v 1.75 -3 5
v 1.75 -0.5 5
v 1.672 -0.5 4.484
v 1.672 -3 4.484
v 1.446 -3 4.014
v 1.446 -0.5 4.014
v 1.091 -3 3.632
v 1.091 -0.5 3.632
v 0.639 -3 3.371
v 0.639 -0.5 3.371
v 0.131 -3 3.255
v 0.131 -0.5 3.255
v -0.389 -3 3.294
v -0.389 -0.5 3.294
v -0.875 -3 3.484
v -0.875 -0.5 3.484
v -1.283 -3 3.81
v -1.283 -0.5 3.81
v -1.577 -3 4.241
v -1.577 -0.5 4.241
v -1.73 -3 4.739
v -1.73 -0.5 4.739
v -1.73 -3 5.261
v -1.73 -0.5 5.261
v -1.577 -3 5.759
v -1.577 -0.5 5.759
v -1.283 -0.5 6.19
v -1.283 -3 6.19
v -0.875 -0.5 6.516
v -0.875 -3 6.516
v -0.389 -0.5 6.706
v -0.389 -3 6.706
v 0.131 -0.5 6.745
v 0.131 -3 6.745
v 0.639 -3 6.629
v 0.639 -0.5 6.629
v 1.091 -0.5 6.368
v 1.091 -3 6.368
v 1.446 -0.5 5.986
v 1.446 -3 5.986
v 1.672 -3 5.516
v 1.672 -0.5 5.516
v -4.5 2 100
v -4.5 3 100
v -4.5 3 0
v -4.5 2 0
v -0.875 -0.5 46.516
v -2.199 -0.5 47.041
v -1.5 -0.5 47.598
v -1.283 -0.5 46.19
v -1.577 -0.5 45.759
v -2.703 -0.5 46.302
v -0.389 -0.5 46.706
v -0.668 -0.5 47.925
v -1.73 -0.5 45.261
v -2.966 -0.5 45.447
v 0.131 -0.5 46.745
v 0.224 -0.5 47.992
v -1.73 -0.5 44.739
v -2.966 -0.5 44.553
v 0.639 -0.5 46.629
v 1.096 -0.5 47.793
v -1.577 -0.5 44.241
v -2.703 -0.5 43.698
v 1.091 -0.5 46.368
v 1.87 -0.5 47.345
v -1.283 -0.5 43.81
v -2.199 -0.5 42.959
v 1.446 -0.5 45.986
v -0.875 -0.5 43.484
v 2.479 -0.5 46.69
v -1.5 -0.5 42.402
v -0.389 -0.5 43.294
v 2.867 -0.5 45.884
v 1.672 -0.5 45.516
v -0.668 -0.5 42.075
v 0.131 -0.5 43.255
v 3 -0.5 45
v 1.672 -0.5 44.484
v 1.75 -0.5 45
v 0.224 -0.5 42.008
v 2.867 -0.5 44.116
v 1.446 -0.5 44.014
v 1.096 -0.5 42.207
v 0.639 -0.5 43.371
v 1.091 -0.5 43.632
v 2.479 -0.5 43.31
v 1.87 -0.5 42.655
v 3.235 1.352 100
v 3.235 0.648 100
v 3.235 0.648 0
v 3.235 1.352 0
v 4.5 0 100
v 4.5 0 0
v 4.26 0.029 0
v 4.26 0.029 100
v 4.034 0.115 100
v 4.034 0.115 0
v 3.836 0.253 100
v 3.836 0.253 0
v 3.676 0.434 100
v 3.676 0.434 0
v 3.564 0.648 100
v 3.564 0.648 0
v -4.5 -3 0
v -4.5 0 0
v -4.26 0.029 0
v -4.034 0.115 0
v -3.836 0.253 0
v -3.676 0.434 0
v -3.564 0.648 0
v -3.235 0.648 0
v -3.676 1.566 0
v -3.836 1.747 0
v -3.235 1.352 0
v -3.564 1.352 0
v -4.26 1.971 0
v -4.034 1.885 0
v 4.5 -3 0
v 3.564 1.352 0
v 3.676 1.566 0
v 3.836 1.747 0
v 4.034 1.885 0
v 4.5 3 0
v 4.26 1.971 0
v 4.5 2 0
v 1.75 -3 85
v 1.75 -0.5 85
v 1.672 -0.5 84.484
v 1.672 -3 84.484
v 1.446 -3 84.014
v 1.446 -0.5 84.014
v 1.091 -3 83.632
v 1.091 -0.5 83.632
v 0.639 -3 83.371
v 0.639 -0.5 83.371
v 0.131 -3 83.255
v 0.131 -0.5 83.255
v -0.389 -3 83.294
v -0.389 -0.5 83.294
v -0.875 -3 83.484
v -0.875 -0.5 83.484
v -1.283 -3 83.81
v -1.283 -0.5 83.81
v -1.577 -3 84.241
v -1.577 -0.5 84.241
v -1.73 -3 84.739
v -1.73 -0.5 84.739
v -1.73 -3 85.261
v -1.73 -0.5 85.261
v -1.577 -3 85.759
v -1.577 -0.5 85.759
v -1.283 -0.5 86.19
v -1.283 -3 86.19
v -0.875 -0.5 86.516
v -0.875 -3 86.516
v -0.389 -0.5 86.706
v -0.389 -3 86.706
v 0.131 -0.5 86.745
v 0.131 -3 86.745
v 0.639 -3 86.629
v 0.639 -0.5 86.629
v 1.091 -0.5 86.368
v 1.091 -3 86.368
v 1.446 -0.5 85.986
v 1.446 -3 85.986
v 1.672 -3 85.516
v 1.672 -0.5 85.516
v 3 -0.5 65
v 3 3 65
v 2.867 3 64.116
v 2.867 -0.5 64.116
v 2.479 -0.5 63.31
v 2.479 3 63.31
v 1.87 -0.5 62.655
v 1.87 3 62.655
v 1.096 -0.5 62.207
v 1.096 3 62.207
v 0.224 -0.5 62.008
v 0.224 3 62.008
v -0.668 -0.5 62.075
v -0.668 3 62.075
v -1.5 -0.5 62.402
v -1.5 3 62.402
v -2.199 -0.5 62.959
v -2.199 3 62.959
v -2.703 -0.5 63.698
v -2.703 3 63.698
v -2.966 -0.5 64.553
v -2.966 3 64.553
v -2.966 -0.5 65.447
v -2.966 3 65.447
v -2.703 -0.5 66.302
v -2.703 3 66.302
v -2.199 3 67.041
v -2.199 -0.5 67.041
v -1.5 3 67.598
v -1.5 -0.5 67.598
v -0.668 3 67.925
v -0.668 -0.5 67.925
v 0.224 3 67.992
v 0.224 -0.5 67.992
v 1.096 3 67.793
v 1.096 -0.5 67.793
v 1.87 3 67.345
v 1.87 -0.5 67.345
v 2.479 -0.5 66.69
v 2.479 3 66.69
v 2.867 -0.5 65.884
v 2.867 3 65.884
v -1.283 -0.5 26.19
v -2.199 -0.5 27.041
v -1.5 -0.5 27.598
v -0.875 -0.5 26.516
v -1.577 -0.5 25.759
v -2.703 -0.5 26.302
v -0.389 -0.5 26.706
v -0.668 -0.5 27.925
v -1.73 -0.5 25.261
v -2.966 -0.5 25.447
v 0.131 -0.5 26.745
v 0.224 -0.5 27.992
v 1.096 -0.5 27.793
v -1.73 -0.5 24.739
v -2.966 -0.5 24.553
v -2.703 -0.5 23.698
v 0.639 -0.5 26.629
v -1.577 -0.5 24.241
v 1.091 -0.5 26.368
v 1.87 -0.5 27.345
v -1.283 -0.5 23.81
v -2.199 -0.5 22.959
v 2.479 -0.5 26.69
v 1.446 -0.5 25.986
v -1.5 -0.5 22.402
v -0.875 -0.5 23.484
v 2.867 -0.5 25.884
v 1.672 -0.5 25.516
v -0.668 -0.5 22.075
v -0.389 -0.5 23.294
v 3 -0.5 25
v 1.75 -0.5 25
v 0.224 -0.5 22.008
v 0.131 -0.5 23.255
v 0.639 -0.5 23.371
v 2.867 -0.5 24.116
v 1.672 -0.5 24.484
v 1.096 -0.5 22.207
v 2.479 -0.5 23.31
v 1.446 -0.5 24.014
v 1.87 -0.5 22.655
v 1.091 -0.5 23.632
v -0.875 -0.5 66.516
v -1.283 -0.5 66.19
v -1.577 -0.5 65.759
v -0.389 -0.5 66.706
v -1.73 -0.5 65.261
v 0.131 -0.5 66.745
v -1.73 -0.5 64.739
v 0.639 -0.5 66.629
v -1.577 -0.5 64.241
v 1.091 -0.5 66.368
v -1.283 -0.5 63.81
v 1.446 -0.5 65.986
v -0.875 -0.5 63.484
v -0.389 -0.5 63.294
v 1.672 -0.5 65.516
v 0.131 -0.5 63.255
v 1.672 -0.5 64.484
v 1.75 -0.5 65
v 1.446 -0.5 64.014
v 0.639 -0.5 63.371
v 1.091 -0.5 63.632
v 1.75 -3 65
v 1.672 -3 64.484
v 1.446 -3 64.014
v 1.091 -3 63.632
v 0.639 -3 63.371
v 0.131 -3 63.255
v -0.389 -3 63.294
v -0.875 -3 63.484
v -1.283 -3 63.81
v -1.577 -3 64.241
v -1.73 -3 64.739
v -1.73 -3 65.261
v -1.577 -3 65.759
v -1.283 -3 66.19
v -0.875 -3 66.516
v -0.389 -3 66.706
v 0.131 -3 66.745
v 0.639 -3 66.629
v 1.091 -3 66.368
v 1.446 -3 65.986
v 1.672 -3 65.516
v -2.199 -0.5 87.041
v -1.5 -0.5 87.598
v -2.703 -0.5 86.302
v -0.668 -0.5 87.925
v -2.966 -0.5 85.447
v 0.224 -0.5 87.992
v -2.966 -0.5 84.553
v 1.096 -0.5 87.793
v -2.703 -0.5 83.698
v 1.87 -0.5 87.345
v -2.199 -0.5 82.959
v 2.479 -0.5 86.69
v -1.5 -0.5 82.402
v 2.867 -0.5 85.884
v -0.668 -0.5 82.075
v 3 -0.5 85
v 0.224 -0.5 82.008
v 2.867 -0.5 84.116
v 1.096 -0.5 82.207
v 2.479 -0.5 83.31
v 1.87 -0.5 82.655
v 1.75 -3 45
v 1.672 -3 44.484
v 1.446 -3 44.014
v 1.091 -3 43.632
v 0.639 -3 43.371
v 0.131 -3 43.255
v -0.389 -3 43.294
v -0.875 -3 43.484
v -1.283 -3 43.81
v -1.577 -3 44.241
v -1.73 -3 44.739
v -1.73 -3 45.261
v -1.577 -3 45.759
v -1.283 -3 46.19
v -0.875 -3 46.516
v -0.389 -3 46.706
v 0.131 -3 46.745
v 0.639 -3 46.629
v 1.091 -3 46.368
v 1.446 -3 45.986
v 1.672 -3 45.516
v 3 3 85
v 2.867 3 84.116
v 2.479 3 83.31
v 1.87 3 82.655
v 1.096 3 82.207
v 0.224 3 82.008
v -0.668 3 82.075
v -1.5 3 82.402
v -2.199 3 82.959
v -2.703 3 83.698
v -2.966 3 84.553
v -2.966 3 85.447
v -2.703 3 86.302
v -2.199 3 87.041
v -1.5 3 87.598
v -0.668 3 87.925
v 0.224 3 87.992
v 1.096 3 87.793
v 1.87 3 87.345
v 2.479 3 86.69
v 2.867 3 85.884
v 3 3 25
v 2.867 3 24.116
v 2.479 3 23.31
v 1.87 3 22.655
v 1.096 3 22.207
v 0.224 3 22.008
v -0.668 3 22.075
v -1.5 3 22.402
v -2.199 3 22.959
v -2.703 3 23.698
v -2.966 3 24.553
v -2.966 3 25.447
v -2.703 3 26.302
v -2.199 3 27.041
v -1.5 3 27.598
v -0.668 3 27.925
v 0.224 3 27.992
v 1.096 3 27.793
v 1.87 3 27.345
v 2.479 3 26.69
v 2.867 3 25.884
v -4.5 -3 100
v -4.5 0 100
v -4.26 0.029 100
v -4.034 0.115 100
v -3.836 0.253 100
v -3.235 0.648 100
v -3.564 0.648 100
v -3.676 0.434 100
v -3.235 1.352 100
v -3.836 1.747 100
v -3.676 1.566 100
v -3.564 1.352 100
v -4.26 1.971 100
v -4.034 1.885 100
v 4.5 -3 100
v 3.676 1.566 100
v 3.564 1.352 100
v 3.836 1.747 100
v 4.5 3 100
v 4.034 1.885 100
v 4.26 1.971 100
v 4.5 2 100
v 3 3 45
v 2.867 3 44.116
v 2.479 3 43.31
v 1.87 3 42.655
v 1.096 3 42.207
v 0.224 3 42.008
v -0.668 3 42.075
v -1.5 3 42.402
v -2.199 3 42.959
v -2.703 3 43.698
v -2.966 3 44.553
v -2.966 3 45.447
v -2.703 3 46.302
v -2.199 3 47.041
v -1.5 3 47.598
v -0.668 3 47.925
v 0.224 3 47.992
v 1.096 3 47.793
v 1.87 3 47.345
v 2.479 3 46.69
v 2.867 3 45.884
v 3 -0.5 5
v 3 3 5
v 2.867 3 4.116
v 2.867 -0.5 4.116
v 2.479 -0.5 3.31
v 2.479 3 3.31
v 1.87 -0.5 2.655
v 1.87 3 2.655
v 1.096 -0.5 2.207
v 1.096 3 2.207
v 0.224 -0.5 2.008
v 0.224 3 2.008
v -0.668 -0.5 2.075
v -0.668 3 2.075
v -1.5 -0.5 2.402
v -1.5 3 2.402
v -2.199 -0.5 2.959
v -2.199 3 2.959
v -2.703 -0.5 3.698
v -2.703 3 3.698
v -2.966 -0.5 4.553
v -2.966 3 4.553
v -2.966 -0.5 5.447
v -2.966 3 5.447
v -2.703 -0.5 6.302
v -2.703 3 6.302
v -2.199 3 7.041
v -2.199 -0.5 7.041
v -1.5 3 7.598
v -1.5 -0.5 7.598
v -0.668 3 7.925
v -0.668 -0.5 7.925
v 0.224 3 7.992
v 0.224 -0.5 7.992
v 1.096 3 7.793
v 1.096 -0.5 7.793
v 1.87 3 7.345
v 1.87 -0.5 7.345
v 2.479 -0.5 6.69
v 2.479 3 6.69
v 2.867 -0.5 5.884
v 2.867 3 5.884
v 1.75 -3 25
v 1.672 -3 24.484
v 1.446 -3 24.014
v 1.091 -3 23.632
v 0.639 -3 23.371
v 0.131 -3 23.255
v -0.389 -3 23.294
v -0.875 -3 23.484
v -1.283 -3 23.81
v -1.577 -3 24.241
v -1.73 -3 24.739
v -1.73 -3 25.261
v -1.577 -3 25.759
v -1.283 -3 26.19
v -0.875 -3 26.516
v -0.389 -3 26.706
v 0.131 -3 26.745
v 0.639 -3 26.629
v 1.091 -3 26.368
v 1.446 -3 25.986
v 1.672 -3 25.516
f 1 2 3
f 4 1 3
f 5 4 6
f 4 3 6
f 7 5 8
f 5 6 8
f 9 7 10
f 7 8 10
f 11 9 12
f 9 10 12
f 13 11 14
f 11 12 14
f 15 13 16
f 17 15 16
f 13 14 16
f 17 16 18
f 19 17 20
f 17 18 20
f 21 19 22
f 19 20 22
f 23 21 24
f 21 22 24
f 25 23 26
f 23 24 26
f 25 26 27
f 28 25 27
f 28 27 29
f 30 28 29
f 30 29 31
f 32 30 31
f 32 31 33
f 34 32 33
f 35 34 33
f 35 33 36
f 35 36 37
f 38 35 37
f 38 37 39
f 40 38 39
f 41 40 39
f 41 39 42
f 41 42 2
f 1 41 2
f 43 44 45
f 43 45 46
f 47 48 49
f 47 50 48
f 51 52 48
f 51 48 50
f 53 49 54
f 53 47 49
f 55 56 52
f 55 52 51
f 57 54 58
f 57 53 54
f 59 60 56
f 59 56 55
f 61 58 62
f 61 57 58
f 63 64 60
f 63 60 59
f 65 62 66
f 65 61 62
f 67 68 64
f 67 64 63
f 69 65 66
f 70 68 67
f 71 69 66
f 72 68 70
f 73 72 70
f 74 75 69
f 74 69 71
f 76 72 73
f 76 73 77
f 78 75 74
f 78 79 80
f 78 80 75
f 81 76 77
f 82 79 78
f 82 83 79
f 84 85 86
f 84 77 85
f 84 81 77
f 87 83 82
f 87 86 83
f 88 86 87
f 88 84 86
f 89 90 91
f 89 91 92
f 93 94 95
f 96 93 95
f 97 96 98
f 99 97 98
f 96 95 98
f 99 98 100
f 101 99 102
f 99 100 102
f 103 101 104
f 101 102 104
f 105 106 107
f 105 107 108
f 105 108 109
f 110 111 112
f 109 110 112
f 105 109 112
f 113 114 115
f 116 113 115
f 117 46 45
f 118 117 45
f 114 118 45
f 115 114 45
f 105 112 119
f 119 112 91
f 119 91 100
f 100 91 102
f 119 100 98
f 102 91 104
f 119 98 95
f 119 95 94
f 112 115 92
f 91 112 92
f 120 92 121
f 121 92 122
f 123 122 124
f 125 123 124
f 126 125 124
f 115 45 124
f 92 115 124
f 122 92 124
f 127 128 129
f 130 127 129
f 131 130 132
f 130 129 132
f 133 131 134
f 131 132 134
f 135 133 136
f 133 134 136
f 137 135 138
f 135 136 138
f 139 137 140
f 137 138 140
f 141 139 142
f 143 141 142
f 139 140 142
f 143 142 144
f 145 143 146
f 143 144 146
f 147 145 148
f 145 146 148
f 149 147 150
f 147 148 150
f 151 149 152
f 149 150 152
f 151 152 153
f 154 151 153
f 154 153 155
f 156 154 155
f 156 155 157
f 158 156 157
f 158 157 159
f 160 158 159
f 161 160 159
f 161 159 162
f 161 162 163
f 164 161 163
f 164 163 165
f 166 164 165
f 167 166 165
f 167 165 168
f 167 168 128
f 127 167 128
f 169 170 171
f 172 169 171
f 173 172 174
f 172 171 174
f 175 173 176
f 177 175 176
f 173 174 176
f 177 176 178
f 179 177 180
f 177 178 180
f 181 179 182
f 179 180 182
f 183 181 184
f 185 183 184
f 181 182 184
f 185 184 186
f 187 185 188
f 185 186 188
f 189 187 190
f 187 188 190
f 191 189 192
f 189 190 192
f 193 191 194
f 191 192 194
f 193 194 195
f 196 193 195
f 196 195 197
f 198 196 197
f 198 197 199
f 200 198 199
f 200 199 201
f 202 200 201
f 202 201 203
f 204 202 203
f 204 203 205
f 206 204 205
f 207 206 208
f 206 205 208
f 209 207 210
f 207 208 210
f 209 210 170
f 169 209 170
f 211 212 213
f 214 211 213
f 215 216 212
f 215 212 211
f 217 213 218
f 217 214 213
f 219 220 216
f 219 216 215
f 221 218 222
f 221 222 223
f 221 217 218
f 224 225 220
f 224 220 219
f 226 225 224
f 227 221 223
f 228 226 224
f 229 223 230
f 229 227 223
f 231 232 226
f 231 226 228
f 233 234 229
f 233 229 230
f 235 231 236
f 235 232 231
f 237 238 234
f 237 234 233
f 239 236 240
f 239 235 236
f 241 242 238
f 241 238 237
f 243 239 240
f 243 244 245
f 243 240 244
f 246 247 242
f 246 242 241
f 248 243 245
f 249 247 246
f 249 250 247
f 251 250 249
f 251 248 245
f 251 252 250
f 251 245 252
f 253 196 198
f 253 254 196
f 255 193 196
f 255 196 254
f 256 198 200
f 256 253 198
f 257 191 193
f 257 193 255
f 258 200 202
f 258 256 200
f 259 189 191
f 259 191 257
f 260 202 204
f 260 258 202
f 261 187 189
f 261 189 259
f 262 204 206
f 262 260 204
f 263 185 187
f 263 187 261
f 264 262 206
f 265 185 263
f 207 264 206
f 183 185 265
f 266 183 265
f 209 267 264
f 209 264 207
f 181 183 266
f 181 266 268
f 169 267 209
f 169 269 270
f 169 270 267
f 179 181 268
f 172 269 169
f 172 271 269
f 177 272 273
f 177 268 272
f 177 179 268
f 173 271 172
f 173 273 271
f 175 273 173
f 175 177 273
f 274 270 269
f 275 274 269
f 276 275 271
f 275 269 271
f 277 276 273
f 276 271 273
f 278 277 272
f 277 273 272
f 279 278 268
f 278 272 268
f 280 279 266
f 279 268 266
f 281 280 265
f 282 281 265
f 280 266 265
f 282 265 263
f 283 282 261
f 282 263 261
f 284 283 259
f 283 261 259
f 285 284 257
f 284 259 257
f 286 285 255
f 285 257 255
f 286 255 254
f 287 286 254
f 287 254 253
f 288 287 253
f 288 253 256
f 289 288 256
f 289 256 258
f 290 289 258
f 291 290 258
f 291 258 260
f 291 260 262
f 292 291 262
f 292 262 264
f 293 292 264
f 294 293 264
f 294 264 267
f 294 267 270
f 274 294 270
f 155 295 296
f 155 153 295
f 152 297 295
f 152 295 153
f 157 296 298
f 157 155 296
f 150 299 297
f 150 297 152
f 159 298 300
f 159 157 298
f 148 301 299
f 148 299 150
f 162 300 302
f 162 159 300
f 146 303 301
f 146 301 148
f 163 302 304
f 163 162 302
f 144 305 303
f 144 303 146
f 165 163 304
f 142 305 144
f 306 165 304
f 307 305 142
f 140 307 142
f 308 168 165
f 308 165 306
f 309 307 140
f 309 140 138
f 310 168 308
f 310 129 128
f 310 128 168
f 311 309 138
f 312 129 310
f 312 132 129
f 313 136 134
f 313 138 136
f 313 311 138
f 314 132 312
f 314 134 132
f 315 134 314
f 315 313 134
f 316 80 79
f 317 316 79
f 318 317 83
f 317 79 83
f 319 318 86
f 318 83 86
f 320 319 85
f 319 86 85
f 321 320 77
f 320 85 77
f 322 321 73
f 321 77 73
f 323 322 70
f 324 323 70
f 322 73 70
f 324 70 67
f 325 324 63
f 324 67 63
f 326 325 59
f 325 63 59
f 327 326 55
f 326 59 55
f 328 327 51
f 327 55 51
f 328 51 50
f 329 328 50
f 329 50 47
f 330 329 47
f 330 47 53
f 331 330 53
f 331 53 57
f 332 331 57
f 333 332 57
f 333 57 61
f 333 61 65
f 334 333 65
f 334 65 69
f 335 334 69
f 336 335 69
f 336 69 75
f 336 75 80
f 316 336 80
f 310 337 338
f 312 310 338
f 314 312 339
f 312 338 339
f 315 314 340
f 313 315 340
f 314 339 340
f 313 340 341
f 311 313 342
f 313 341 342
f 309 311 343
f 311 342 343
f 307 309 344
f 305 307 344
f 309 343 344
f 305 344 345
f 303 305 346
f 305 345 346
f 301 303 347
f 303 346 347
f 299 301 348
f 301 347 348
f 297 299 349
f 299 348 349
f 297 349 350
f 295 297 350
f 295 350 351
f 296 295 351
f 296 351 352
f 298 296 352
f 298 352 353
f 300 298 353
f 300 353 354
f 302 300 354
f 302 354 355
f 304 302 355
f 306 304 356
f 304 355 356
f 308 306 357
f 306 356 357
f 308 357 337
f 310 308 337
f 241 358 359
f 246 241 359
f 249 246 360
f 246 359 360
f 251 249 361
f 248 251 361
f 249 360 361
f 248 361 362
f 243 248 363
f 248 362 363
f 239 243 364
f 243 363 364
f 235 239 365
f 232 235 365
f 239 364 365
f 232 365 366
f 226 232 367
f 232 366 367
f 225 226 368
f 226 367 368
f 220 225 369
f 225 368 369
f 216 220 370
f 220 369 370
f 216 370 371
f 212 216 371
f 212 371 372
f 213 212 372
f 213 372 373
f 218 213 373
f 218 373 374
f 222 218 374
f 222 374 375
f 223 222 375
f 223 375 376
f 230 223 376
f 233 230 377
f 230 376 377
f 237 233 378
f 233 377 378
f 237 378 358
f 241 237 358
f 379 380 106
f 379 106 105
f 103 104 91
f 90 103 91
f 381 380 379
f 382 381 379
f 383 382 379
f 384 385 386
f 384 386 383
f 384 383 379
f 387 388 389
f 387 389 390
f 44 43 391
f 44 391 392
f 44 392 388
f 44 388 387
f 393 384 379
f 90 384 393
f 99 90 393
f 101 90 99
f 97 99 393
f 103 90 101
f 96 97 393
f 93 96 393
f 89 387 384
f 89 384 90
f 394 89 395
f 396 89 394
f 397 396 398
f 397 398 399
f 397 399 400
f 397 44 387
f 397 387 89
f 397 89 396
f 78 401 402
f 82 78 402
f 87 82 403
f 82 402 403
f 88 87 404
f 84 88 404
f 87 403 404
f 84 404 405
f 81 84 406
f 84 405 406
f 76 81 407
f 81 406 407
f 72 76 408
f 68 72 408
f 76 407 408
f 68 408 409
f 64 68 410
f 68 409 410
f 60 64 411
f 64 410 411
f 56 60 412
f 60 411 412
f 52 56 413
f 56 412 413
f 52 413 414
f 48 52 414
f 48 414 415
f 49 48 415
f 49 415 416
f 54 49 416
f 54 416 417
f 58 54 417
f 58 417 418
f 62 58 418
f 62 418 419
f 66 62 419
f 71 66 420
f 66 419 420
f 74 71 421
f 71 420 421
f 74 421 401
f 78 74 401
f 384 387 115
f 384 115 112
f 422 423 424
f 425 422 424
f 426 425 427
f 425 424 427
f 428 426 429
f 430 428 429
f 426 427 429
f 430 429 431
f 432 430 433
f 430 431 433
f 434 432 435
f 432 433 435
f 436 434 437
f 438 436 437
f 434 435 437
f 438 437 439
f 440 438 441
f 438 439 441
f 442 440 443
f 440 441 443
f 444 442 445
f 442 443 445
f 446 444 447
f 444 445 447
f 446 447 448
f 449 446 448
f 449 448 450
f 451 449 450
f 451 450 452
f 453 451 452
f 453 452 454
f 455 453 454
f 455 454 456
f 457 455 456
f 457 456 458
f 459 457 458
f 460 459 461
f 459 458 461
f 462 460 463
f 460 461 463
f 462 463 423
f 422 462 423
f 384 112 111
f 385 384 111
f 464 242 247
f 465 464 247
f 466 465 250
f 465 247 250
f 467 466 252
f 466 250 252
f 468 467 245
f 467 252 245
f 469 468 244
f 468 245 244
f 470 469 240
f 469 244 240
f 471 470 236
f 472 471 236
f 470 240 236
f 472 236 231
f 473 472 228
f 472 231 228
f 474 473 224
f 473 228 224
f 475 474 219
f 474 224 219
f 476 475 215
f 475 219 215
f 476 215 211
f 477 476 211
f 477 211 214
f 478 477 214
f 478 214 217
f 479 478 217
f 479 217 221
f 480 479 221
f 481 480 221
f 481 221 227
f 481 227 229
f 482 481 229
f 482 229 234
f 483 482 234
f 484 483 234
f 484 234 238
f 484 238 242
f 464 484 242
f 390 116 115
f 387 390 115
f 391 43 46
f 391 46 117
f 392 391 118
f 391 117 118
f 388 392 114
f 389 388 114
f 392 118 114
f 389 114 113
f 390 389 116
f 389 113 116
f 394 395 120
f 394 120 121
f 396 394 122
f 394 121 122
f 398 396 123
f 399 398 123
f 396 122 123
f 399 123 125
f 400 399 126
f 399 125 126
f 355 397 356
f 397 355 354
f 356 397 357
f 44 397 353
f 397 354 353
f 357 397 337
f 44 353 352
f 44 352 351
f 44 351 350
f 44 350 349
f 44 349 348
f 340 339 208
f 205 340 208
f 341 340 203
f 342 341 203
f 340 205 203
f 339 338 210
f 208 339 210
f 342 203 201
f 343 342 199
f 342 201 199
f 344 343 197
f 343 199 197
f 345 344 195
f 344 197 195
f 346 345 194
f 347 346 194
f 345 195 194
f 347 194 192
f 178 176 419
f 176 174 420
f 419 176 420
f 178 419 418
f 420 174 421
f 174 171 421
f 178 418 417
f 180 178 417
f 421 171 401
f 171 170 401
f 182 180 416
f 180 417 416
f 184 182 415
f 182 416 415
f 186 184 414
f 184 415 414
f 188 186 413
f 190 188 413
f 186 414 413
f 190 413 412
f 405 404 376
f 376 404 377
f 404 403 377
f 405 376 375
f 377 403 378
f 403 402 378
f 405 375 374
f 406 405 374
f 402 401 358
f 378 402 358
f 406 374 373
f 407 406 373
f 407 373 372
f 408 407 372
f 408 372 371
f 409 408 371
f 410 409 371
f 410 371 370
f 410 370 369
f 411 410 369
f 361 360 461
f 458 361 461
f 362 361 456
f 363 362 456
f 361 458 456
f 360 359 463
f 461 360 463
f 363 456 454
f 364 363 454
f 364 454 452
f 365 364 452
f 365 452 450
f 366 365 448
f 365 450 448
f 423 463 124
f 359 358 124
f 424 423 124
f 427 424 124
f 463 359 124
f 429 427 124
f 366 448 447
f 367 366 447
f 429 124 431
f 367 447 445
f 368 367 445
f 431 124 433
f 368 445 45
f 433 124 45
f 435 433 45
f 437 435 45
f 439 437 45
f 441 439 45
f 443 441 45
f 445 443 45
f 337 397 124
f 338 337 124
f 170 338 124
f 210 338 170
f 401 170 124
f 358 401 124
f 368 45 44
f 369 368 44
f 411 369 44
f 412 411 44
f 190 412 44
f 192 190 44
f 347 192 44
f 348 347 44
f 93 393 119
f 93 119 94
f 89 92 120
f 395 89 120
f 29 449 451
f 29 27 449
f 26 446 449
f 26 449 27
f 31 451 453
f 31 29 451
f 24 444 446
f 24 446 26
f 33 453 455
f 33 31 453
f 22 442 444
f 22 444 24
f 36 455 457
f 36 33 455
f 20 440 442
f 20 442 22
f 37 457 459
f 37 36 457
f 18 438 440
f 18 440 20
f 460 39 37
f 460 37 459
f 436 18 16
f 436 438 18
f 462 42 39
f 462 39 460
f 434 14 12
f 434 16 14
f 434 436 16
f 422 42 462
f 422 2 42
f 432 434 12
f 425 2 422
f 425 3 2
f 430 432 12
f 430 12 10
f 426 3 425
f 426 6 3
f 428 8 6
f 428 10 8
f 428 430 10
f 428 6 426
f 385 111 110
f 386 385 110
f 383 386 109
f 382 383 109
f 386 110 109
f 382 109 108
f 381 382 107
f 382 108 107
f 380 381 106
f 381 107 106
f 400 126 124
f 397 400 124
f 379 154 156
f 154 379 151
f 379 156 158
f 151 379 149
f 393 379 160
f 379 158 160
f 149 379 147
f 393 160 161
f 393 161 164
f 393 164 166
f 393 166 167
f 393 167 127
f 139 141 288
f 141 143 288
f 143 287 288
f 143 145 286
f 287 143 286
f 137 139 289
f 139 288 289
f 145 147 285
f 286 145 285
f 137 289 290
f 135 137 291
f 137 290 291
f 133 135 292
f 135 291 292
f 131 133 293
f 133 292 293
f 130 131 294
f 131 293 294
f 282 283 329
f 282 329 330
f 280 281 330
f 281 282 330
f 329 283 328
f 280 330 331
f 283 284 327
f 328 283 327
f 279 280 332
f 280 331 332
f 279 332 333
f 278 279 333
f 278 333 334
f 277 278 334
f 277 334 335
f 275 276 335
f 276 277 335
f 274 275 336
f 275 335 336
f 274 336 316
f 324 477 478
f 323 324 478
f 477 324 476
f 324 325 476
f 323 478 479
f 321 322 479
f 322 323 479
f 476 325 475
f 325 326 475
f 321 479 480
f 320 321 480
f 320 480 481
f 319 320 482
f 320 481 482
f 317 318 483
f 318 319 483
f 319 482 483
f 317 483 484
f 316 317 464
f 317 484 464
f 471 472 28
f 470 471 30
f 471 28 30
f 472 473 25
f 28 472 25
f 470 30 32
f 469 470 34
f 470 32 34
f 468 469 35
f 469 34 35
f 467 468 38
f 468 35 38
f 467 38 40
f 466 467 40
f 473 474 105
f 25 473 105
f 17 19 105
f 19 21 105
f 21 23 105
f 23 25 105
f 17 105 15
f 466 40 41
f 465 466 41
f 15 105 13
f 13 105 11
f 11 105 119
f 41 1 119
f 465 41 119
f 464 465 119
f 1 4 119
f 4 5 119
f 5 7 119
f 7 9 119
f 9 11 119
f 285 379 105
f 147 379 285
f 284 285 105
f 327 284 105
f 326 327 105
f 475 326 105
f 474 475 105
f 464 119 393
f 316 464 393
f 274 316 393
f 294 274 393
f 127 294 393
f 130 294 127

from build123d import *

# Parameters (mm, degrees)
EXTRUDE1_DEPTH  = 100
SKETCH2_R       = 3
EXTRUDE2_DEPTH  = 3.5
SKETCH_R        = 1.75
EXTRUDE3_DEPTH  = 7
LPATTERN1_COUNT = 30
LPATTERN1_PITCH = 20


with BuildPart() as part:
    # Sketch1 → Extrude1 (new body)
    with BuildSketch(Plane.XY):
        with BuildLine():
            Line((-4.5, -3), (4.5, -3))
            Line((4.5, -3), (4.5, 0))
            ThreePointArc((4.5, 0), (3.93077967, 0.177814974), (3.563991137, 0.648023568))
            Line((3.563991137, 0.648023568), (3.235073025, 0.648023568))
            Line((3.235073025, 0.648023568), (3.235073025, 1.351976432))
            Line((3.235073025, 1.351976432), (3.563991137, 1.351976432))
            ThreePointArc((3.563991137, 1.351976432), (3.93077967, 1.822185026), (4.5, 2))
            Line((4.5, 2), (4.5, 3))
            Line((4.5, 3), (-4.5, 3))
            Line((-4.5, 3), (-4.5, 2))
            ThreePointArc((-4.5, 2), (-3.93077967, 1.822185026), (-3.563991137, 1.351976432))
            Line((-3.563991137, 1.351976432), (-3.235073025, 1.351976432))
            Line((-3.235073025, 1.351976432), (-3.235073025, 0.648023568))
            Line((-3.235073025, 0.648023568), (-3.563991137, 0.648023568))
            ThreePointArc((-3.563991137, 0.648023568), (-3.93077967, 0.177814974), (-4.5, 0))
            Line((-4.5, 0), (-4.5, -3))
        make_face()
    extrude(amount=EXTRUDE1_DEPTH)

    # Sketch2 → Extrude2 (cut)
    with BuildSketch(Plane(origin=(0, 3, 0), x_dir=(1, 0, 0), z_dir=(0, 1, 0))):
        with Locations((0, -5)):
            Circle(SKETCH2_R)
    extrude2 = extrude(amount=-EXTRUDE2_DEPTH, mode=Mode.SUBTRACT)

    # Sketch → Extrude3 (cut, through all)
    with BuildSketch(Plane(origin=(0, 3, 0), x_dir=(1, 0, 0), z_dir=(0, 1, 0))):
        with Locations((0, -5)):
            Circle(SKETCH_R)
    extrude3 = extrude(amount=-EXTRUDE3_DEPTH, mode=Mode.SUBTRACT)

    # LPattern1: Extrude2, Extrude3 ×30
    with Locations(*[(0, 0, i * LPATTERN1_PITCH) for i in range(1, LPATTERN1_COUNT)]):
        add(extrude2, mode=Mode.SUBTRACT)
        add(extrude3, mode=Mode.SUBTRACT)


solid = part.part
